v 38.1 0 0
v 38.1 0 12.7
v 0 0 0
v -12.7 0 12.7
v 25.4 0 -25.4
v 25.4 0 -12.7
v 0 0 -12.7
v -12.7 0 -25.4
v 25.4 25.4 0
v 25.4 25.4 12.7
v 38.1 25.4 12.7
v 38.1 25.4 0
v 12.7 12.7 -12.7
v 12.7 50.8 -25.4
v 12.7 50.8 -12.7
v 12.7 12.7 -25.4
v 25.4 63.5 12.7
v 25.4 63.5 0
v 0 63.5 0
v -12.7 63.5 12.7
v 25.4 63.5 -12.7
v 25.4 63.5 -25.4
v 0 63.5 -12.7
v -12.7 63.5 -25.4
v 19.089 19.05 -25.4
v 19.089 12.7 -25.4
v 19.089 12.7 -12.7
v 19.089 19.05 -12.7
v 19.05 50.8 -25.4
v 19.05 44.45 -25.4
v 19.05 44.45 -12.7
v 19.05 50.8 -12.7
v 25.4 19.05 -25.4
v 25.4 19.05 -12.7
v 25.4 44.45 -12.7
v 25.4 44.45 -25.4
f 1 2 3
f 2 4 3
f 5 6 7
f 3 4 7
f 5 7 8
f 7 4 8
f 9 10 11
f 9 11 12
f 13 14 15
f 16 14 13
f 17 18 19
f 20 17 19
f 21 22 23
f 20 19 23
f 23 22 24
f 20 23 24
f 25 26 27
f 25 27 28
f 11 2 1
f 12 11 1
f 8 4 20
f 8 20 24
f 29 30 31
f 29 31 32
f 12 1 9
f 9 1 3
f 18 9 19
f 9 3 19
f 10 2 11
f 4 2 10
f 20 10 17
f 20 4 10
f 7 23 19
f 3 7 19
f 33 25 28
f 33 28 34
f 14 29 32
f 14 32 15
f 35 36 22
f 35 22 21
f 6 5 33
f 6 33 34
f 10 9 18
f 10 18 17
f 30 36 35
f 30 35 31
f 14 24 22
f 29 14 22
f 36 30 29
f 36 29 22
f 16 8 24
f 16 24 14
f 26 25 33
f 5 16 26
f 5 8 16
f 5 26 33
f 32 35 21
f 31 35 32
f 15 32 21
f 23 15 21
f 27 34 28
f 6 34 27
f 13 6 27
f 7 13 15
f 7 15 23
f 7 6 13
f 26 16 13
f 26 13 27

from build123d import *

# Parameters (mm, degrees)
BOSS_EXTRUDE1_DEPTH = 63.5
CUT_EXTRUDE3_DEPTH  = 12.7
SKETCH3_W           = 12.7
SKETCH3_H           = 25.4
BOSS_EXTRUDE2_DEPTH = 12.7


with BuildPart() as part:
    # Sketch1 → Boss-Extrude1 (new body)
    with BuildSketch(Plane(origin=(0, 0, 0), x_dir=(1, 0, 0), z_dir=(0, 1, 0))):
        Polygon((0, 0), (25.4, 0), (25.4, -12.7), (-12.7, -12.7), (-12.7, 25.4), (25.4, 25.4), (25.4, 12.7), (0, 12.7), align=None)
    extrude(amount=BOSS_EXTRUDE1_DEPTH)

    # Sketch2 → Cut-Extrude3 (cut)
    with BuildSketch(Plane(origin=(0, 0, -25.4), x_dir=(-1, 0, 0), z_dir=(0, 0, -1))):
        Polygon((-25.4, 44.45), (-19.05, 44.45), (-19.05, 50.8), (-12.7, 50.8), (-12.7, 12.7), (-19.088668149, 12.7), (-19.088668149, 19.05), (-25.4, 19.05), align=None)
    extrude(amount=-CUT_EXTRUDE3_DEPTH, mode=Mode.SUBTRACT)

    # Sketch3 → Boss-Extrude2 (add)
    with BuildSketch(Plane(origin=(25.4, 0, 0), x_dir=(0, 0, -1), z_dir=(1, 0, 0))):
        with Locations((-6.35, 12.7)):
            Rectangle(SKETCH3_W, SKETCH3_H)
    extrude(amount=BOSS_EXTRUDE2_DEPTH)


solid = part.part
